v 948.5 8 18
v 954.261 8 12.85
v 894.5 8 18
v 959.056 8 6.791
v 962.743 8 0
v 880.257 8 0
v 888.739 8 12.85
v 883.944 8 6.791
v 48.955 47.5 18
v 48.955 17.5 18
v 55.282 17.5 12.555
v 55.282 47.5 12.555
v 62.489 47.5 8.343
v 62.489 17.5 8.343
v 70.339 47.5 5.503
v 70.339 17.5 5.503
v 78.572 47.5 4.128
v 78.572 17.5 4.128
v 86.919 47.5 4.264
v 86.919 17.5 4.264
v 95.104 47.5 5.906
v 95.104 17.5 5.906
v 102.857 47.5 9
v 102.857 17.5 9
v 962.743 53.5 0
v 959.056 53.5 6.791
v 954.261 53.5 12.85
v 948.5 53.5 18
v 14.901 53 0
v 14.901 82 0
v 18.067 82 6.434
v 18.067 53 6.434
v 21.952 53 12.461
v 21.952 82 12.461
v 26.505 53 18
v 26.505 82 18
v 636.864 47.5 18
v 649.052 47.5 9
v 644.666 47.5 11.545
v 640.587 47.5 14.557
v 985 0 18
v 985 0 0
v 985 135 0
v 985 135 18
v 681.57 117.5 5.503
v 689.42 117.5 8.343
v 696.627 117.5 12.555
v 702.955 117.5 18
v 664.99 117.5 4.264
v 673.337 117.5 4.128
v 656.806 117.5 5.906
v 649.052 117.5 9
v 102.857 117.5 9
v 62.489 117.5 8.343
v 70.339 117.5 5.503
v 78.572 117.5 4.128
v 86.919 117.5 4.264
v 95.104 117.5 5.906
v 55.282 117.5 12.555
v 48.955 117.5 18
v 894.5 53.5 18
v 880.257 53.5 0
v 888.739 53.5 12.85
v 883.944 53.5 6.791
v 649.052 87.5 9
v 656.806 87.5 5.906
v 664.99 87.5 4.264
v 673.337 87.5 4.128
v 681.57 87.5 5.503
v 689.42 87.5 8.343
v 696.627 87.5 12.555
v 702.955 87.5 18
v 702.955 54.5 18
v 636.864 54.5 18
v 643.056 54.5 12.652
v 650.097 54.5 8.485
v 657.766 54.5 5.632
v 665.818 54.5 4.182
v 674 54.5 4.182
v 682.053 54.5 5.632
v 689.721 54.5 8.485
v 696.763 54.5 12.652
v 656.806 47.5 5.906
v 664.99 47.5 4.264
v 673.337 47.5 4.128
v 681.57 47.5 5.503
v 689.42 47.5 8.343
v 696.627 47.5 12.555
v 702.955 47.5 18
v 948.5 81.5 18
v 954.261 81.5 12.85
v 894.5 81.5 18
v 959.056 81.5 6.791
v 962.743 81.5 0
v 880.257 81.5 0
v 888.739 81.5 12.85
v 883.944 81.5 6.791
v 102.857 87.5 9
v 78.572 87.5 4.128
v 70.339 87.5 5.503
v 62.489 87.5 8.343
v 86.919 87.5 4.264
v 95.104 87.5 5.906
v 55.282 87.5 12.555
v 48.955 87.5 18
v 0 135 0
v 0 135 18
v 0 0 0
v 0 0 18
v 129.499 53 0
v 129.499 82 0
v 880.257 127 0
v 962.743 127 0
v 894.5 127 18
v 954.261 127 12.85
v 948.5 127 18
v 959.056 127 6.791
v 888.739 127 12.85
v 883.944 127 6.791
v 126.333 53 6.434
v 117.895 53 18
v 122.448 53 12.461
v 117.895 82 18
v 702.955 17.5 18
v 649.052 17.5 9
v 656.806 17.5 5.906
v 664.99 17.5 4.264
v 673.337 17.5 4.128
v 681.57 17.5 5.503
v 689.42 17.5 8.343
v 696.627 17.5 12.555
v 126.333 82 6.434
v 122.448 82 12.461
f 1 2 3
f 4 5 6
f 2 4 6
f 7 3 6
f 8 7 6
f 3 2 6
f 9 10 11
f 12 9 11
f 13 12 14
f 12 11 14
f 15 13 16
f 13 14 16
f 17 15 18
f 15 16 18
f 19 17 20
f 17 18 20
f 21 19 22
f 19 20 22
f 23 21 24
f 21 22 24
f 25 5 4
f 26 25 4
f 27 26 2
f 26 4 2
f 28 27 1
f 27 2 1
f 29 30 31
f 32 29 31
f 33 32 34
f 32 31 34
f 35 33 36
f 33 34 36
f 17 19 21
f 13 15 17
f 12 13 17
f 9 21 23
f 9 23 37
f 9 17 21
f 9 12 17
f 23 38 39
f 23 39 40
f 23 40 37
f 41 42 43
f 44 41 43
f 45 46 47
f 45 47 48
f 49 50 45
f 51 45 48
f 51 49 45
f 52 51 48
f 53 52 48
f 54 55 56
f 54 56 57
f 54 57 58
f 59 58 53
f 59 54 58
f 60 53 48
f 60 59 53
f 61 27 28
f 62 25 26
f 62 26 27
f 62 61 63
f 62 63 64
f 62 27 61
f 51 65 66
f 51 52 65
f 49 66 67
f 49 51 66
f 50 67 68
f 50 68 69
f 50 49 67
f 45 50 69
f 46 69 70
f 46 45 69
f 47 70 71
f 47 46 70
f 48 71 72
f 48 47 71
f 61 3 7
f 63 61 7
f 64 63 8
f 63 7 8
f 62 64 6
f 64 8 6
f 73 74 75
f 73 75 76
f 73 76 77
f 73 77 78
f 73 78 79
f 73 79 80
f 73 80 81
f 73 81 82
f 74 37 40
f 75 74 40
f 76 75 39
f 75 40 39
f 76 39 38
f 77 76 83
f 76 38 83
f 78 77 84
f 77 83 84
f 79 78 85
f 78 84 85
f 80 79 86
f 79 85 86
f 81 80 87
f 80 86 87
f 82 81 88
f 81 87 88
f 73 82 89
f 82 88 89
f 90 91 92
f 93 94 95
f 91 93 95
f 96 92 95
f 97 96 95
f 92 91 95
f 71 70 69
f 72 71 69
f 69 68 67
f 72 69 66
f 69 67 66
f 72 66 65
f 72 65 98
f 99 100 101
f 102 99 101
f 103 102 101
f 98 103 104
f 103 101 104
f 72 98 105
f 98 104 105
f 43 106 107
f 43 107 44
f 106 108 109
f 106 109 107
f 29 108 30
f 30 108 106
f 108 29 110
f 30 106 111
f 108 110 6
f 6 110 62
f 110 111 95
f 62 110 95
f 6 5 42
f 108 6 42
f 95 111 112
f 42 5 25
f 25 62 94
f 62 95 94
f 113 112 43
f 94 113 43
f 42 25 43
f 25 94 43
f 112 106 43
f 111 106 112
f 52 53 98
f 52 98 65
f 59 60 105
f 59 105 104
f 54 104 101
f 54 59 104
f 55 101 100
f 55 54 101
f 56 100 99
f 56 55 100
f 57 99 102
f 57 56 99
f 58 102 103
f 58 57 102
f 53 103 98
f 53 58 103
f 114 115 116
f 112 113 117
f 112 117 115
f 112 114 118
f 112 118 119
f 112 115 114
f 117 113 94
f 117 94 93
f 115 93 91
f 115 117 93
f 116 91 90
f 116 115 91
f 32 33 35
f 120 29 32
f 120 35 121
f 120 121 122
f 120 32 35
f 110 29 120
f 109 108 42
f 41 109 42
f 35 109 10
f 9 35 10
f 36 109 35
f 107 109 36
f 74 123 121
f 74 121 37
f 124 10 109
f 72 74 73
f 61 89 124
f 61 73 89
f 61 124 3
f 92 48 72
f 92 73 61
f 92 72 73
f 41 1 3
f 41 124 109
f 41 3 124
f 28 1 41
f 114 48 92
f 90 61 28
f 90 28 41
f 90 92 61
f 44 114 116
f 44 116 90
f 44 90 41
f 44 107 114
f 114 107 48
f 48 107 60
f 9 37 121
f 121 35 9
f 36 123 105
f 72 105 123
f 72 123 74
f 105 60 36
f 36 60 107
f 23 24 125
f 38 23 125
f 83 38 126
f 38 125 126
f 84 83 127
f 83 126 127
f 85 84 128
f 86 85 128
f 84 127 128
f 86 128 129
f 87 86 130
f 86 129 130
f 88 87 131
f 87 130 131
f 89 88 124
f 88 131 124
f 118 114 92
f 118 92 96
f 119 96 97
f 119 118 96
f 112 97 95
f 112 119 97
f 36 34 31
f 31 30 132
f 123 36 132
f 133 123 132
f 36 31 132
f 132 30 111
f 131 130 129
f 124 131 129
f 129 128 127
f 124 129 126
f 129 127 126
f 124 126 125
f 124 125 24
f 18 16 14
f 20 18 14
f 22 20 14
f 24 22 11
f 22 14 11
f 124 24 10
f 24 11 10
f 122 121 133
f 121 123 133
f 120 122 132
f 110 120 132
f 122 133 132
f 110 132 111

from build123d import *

# Parameters (mm, degrees)
CROQUIS1_W              = 985
CROQUIS1_H              = 135
SALIENTE_EXTRUIR1_DEPTH = 18
CROQUIS2_R              = 45
CORTAR_EXTRUIR1_DEPTH   = 45.5
CROQUIS4_R              = 62.2
CORTAR_EXTRUIR2_DEPTH   = 14.5
CORTAR_EXTRUIR3_DEPTH   = 15
CROQUIS7_R              = 46
CORTAR_EXTRUIR4_DEPTH   = 7


with BuildPart() as part:
    # Croquis1 → Saliente-Extruir1 (new body)
    with BuildSketch(Plane.XY):
        with Locations((492.5, 67.5)):
            Rectangle(CROQUIS1_W, CROQUIS1_H)
    extrude(amount=SALIENTE_EXTRUIR1_DEPTH)

    # Croquis2 → Cortar-Extruir1 (cut)
    with BuildSketch(Plane(origin=(0, 8, 0), x_dir=(-1, 0, 0), z_dir=(0, -1, 0))):
        with Locations((-921.5, 18)):
            Circle(CROQUIS2_R)
    cortar_extruir1 = extrude(amount=-CORTAR_EXTRUIR1_DEPTH, mode=Mode.SUBTRACT)

    # Simetría1: Cortar-Extruir1 across plane
    add(cortar_extruir1.mirror(Plane.ZX.offset(67.5)), mode=Mode.SUBTRACT)

    # Croquis4 → Cortar-Extruir2 (cut, symmetric)
    with BuildSketch(Plane(origin=(0, 67.5, 0), x_dir=(1, 0, 0), z_dir=(0, 1, 0))):
        with Locations((72.2, 24.2)):
            Circle(CROQUIS4_R)
    extrude(amount=CORTAR_EXTRUIR2_DEPTH, both=True, mode=Mode.SUBTRACT)

    # Croquis5 → Cortar-Extruir3 (cut, symmetric)
    with BuildSketch(Plane(origin=(0, 102.5, 0), x_dir=(1, 0, 0), z_dir=(0, 1, 0))):
        with BuildLine():
            Line((102.856653615, -9), (649.052499818, -9))
            ThreePointArc((649.052499818, -9), (677.48487297, -4.628109214), (702.954576716, -18))
            Line((702.954576716, -18), (48.954576716, -18))
            ThreePointArc((48.954576716, -18), (74.424280462, -4.628109214), (102.856653615, -9))
        make_face()
    cortar_extruir3 = extrude(amount=CORTAR_EXTRUIR3_DEPTH, both=True, mode=Mode.SUBTRACT)

    # Simetría5: Cortar-Extruir3 across plane
    add(cortar_extruir3.mirror(Plane.ZX.offset(67.5)), mode=Mode.SUBTRACT)

    # Croquis7 → Cortar-Extruir4 (cut)
    with BuildSketch(Plane.XZ.offset(-47.5)):
        with Locations((669.909153433, 50)):
            Circle(CROQUIS7_R)
    extrude(amount=-CORTAR_EXTRUIR4_DEPTH, mode=Mode.SUBTRACT)


solid = part.part
